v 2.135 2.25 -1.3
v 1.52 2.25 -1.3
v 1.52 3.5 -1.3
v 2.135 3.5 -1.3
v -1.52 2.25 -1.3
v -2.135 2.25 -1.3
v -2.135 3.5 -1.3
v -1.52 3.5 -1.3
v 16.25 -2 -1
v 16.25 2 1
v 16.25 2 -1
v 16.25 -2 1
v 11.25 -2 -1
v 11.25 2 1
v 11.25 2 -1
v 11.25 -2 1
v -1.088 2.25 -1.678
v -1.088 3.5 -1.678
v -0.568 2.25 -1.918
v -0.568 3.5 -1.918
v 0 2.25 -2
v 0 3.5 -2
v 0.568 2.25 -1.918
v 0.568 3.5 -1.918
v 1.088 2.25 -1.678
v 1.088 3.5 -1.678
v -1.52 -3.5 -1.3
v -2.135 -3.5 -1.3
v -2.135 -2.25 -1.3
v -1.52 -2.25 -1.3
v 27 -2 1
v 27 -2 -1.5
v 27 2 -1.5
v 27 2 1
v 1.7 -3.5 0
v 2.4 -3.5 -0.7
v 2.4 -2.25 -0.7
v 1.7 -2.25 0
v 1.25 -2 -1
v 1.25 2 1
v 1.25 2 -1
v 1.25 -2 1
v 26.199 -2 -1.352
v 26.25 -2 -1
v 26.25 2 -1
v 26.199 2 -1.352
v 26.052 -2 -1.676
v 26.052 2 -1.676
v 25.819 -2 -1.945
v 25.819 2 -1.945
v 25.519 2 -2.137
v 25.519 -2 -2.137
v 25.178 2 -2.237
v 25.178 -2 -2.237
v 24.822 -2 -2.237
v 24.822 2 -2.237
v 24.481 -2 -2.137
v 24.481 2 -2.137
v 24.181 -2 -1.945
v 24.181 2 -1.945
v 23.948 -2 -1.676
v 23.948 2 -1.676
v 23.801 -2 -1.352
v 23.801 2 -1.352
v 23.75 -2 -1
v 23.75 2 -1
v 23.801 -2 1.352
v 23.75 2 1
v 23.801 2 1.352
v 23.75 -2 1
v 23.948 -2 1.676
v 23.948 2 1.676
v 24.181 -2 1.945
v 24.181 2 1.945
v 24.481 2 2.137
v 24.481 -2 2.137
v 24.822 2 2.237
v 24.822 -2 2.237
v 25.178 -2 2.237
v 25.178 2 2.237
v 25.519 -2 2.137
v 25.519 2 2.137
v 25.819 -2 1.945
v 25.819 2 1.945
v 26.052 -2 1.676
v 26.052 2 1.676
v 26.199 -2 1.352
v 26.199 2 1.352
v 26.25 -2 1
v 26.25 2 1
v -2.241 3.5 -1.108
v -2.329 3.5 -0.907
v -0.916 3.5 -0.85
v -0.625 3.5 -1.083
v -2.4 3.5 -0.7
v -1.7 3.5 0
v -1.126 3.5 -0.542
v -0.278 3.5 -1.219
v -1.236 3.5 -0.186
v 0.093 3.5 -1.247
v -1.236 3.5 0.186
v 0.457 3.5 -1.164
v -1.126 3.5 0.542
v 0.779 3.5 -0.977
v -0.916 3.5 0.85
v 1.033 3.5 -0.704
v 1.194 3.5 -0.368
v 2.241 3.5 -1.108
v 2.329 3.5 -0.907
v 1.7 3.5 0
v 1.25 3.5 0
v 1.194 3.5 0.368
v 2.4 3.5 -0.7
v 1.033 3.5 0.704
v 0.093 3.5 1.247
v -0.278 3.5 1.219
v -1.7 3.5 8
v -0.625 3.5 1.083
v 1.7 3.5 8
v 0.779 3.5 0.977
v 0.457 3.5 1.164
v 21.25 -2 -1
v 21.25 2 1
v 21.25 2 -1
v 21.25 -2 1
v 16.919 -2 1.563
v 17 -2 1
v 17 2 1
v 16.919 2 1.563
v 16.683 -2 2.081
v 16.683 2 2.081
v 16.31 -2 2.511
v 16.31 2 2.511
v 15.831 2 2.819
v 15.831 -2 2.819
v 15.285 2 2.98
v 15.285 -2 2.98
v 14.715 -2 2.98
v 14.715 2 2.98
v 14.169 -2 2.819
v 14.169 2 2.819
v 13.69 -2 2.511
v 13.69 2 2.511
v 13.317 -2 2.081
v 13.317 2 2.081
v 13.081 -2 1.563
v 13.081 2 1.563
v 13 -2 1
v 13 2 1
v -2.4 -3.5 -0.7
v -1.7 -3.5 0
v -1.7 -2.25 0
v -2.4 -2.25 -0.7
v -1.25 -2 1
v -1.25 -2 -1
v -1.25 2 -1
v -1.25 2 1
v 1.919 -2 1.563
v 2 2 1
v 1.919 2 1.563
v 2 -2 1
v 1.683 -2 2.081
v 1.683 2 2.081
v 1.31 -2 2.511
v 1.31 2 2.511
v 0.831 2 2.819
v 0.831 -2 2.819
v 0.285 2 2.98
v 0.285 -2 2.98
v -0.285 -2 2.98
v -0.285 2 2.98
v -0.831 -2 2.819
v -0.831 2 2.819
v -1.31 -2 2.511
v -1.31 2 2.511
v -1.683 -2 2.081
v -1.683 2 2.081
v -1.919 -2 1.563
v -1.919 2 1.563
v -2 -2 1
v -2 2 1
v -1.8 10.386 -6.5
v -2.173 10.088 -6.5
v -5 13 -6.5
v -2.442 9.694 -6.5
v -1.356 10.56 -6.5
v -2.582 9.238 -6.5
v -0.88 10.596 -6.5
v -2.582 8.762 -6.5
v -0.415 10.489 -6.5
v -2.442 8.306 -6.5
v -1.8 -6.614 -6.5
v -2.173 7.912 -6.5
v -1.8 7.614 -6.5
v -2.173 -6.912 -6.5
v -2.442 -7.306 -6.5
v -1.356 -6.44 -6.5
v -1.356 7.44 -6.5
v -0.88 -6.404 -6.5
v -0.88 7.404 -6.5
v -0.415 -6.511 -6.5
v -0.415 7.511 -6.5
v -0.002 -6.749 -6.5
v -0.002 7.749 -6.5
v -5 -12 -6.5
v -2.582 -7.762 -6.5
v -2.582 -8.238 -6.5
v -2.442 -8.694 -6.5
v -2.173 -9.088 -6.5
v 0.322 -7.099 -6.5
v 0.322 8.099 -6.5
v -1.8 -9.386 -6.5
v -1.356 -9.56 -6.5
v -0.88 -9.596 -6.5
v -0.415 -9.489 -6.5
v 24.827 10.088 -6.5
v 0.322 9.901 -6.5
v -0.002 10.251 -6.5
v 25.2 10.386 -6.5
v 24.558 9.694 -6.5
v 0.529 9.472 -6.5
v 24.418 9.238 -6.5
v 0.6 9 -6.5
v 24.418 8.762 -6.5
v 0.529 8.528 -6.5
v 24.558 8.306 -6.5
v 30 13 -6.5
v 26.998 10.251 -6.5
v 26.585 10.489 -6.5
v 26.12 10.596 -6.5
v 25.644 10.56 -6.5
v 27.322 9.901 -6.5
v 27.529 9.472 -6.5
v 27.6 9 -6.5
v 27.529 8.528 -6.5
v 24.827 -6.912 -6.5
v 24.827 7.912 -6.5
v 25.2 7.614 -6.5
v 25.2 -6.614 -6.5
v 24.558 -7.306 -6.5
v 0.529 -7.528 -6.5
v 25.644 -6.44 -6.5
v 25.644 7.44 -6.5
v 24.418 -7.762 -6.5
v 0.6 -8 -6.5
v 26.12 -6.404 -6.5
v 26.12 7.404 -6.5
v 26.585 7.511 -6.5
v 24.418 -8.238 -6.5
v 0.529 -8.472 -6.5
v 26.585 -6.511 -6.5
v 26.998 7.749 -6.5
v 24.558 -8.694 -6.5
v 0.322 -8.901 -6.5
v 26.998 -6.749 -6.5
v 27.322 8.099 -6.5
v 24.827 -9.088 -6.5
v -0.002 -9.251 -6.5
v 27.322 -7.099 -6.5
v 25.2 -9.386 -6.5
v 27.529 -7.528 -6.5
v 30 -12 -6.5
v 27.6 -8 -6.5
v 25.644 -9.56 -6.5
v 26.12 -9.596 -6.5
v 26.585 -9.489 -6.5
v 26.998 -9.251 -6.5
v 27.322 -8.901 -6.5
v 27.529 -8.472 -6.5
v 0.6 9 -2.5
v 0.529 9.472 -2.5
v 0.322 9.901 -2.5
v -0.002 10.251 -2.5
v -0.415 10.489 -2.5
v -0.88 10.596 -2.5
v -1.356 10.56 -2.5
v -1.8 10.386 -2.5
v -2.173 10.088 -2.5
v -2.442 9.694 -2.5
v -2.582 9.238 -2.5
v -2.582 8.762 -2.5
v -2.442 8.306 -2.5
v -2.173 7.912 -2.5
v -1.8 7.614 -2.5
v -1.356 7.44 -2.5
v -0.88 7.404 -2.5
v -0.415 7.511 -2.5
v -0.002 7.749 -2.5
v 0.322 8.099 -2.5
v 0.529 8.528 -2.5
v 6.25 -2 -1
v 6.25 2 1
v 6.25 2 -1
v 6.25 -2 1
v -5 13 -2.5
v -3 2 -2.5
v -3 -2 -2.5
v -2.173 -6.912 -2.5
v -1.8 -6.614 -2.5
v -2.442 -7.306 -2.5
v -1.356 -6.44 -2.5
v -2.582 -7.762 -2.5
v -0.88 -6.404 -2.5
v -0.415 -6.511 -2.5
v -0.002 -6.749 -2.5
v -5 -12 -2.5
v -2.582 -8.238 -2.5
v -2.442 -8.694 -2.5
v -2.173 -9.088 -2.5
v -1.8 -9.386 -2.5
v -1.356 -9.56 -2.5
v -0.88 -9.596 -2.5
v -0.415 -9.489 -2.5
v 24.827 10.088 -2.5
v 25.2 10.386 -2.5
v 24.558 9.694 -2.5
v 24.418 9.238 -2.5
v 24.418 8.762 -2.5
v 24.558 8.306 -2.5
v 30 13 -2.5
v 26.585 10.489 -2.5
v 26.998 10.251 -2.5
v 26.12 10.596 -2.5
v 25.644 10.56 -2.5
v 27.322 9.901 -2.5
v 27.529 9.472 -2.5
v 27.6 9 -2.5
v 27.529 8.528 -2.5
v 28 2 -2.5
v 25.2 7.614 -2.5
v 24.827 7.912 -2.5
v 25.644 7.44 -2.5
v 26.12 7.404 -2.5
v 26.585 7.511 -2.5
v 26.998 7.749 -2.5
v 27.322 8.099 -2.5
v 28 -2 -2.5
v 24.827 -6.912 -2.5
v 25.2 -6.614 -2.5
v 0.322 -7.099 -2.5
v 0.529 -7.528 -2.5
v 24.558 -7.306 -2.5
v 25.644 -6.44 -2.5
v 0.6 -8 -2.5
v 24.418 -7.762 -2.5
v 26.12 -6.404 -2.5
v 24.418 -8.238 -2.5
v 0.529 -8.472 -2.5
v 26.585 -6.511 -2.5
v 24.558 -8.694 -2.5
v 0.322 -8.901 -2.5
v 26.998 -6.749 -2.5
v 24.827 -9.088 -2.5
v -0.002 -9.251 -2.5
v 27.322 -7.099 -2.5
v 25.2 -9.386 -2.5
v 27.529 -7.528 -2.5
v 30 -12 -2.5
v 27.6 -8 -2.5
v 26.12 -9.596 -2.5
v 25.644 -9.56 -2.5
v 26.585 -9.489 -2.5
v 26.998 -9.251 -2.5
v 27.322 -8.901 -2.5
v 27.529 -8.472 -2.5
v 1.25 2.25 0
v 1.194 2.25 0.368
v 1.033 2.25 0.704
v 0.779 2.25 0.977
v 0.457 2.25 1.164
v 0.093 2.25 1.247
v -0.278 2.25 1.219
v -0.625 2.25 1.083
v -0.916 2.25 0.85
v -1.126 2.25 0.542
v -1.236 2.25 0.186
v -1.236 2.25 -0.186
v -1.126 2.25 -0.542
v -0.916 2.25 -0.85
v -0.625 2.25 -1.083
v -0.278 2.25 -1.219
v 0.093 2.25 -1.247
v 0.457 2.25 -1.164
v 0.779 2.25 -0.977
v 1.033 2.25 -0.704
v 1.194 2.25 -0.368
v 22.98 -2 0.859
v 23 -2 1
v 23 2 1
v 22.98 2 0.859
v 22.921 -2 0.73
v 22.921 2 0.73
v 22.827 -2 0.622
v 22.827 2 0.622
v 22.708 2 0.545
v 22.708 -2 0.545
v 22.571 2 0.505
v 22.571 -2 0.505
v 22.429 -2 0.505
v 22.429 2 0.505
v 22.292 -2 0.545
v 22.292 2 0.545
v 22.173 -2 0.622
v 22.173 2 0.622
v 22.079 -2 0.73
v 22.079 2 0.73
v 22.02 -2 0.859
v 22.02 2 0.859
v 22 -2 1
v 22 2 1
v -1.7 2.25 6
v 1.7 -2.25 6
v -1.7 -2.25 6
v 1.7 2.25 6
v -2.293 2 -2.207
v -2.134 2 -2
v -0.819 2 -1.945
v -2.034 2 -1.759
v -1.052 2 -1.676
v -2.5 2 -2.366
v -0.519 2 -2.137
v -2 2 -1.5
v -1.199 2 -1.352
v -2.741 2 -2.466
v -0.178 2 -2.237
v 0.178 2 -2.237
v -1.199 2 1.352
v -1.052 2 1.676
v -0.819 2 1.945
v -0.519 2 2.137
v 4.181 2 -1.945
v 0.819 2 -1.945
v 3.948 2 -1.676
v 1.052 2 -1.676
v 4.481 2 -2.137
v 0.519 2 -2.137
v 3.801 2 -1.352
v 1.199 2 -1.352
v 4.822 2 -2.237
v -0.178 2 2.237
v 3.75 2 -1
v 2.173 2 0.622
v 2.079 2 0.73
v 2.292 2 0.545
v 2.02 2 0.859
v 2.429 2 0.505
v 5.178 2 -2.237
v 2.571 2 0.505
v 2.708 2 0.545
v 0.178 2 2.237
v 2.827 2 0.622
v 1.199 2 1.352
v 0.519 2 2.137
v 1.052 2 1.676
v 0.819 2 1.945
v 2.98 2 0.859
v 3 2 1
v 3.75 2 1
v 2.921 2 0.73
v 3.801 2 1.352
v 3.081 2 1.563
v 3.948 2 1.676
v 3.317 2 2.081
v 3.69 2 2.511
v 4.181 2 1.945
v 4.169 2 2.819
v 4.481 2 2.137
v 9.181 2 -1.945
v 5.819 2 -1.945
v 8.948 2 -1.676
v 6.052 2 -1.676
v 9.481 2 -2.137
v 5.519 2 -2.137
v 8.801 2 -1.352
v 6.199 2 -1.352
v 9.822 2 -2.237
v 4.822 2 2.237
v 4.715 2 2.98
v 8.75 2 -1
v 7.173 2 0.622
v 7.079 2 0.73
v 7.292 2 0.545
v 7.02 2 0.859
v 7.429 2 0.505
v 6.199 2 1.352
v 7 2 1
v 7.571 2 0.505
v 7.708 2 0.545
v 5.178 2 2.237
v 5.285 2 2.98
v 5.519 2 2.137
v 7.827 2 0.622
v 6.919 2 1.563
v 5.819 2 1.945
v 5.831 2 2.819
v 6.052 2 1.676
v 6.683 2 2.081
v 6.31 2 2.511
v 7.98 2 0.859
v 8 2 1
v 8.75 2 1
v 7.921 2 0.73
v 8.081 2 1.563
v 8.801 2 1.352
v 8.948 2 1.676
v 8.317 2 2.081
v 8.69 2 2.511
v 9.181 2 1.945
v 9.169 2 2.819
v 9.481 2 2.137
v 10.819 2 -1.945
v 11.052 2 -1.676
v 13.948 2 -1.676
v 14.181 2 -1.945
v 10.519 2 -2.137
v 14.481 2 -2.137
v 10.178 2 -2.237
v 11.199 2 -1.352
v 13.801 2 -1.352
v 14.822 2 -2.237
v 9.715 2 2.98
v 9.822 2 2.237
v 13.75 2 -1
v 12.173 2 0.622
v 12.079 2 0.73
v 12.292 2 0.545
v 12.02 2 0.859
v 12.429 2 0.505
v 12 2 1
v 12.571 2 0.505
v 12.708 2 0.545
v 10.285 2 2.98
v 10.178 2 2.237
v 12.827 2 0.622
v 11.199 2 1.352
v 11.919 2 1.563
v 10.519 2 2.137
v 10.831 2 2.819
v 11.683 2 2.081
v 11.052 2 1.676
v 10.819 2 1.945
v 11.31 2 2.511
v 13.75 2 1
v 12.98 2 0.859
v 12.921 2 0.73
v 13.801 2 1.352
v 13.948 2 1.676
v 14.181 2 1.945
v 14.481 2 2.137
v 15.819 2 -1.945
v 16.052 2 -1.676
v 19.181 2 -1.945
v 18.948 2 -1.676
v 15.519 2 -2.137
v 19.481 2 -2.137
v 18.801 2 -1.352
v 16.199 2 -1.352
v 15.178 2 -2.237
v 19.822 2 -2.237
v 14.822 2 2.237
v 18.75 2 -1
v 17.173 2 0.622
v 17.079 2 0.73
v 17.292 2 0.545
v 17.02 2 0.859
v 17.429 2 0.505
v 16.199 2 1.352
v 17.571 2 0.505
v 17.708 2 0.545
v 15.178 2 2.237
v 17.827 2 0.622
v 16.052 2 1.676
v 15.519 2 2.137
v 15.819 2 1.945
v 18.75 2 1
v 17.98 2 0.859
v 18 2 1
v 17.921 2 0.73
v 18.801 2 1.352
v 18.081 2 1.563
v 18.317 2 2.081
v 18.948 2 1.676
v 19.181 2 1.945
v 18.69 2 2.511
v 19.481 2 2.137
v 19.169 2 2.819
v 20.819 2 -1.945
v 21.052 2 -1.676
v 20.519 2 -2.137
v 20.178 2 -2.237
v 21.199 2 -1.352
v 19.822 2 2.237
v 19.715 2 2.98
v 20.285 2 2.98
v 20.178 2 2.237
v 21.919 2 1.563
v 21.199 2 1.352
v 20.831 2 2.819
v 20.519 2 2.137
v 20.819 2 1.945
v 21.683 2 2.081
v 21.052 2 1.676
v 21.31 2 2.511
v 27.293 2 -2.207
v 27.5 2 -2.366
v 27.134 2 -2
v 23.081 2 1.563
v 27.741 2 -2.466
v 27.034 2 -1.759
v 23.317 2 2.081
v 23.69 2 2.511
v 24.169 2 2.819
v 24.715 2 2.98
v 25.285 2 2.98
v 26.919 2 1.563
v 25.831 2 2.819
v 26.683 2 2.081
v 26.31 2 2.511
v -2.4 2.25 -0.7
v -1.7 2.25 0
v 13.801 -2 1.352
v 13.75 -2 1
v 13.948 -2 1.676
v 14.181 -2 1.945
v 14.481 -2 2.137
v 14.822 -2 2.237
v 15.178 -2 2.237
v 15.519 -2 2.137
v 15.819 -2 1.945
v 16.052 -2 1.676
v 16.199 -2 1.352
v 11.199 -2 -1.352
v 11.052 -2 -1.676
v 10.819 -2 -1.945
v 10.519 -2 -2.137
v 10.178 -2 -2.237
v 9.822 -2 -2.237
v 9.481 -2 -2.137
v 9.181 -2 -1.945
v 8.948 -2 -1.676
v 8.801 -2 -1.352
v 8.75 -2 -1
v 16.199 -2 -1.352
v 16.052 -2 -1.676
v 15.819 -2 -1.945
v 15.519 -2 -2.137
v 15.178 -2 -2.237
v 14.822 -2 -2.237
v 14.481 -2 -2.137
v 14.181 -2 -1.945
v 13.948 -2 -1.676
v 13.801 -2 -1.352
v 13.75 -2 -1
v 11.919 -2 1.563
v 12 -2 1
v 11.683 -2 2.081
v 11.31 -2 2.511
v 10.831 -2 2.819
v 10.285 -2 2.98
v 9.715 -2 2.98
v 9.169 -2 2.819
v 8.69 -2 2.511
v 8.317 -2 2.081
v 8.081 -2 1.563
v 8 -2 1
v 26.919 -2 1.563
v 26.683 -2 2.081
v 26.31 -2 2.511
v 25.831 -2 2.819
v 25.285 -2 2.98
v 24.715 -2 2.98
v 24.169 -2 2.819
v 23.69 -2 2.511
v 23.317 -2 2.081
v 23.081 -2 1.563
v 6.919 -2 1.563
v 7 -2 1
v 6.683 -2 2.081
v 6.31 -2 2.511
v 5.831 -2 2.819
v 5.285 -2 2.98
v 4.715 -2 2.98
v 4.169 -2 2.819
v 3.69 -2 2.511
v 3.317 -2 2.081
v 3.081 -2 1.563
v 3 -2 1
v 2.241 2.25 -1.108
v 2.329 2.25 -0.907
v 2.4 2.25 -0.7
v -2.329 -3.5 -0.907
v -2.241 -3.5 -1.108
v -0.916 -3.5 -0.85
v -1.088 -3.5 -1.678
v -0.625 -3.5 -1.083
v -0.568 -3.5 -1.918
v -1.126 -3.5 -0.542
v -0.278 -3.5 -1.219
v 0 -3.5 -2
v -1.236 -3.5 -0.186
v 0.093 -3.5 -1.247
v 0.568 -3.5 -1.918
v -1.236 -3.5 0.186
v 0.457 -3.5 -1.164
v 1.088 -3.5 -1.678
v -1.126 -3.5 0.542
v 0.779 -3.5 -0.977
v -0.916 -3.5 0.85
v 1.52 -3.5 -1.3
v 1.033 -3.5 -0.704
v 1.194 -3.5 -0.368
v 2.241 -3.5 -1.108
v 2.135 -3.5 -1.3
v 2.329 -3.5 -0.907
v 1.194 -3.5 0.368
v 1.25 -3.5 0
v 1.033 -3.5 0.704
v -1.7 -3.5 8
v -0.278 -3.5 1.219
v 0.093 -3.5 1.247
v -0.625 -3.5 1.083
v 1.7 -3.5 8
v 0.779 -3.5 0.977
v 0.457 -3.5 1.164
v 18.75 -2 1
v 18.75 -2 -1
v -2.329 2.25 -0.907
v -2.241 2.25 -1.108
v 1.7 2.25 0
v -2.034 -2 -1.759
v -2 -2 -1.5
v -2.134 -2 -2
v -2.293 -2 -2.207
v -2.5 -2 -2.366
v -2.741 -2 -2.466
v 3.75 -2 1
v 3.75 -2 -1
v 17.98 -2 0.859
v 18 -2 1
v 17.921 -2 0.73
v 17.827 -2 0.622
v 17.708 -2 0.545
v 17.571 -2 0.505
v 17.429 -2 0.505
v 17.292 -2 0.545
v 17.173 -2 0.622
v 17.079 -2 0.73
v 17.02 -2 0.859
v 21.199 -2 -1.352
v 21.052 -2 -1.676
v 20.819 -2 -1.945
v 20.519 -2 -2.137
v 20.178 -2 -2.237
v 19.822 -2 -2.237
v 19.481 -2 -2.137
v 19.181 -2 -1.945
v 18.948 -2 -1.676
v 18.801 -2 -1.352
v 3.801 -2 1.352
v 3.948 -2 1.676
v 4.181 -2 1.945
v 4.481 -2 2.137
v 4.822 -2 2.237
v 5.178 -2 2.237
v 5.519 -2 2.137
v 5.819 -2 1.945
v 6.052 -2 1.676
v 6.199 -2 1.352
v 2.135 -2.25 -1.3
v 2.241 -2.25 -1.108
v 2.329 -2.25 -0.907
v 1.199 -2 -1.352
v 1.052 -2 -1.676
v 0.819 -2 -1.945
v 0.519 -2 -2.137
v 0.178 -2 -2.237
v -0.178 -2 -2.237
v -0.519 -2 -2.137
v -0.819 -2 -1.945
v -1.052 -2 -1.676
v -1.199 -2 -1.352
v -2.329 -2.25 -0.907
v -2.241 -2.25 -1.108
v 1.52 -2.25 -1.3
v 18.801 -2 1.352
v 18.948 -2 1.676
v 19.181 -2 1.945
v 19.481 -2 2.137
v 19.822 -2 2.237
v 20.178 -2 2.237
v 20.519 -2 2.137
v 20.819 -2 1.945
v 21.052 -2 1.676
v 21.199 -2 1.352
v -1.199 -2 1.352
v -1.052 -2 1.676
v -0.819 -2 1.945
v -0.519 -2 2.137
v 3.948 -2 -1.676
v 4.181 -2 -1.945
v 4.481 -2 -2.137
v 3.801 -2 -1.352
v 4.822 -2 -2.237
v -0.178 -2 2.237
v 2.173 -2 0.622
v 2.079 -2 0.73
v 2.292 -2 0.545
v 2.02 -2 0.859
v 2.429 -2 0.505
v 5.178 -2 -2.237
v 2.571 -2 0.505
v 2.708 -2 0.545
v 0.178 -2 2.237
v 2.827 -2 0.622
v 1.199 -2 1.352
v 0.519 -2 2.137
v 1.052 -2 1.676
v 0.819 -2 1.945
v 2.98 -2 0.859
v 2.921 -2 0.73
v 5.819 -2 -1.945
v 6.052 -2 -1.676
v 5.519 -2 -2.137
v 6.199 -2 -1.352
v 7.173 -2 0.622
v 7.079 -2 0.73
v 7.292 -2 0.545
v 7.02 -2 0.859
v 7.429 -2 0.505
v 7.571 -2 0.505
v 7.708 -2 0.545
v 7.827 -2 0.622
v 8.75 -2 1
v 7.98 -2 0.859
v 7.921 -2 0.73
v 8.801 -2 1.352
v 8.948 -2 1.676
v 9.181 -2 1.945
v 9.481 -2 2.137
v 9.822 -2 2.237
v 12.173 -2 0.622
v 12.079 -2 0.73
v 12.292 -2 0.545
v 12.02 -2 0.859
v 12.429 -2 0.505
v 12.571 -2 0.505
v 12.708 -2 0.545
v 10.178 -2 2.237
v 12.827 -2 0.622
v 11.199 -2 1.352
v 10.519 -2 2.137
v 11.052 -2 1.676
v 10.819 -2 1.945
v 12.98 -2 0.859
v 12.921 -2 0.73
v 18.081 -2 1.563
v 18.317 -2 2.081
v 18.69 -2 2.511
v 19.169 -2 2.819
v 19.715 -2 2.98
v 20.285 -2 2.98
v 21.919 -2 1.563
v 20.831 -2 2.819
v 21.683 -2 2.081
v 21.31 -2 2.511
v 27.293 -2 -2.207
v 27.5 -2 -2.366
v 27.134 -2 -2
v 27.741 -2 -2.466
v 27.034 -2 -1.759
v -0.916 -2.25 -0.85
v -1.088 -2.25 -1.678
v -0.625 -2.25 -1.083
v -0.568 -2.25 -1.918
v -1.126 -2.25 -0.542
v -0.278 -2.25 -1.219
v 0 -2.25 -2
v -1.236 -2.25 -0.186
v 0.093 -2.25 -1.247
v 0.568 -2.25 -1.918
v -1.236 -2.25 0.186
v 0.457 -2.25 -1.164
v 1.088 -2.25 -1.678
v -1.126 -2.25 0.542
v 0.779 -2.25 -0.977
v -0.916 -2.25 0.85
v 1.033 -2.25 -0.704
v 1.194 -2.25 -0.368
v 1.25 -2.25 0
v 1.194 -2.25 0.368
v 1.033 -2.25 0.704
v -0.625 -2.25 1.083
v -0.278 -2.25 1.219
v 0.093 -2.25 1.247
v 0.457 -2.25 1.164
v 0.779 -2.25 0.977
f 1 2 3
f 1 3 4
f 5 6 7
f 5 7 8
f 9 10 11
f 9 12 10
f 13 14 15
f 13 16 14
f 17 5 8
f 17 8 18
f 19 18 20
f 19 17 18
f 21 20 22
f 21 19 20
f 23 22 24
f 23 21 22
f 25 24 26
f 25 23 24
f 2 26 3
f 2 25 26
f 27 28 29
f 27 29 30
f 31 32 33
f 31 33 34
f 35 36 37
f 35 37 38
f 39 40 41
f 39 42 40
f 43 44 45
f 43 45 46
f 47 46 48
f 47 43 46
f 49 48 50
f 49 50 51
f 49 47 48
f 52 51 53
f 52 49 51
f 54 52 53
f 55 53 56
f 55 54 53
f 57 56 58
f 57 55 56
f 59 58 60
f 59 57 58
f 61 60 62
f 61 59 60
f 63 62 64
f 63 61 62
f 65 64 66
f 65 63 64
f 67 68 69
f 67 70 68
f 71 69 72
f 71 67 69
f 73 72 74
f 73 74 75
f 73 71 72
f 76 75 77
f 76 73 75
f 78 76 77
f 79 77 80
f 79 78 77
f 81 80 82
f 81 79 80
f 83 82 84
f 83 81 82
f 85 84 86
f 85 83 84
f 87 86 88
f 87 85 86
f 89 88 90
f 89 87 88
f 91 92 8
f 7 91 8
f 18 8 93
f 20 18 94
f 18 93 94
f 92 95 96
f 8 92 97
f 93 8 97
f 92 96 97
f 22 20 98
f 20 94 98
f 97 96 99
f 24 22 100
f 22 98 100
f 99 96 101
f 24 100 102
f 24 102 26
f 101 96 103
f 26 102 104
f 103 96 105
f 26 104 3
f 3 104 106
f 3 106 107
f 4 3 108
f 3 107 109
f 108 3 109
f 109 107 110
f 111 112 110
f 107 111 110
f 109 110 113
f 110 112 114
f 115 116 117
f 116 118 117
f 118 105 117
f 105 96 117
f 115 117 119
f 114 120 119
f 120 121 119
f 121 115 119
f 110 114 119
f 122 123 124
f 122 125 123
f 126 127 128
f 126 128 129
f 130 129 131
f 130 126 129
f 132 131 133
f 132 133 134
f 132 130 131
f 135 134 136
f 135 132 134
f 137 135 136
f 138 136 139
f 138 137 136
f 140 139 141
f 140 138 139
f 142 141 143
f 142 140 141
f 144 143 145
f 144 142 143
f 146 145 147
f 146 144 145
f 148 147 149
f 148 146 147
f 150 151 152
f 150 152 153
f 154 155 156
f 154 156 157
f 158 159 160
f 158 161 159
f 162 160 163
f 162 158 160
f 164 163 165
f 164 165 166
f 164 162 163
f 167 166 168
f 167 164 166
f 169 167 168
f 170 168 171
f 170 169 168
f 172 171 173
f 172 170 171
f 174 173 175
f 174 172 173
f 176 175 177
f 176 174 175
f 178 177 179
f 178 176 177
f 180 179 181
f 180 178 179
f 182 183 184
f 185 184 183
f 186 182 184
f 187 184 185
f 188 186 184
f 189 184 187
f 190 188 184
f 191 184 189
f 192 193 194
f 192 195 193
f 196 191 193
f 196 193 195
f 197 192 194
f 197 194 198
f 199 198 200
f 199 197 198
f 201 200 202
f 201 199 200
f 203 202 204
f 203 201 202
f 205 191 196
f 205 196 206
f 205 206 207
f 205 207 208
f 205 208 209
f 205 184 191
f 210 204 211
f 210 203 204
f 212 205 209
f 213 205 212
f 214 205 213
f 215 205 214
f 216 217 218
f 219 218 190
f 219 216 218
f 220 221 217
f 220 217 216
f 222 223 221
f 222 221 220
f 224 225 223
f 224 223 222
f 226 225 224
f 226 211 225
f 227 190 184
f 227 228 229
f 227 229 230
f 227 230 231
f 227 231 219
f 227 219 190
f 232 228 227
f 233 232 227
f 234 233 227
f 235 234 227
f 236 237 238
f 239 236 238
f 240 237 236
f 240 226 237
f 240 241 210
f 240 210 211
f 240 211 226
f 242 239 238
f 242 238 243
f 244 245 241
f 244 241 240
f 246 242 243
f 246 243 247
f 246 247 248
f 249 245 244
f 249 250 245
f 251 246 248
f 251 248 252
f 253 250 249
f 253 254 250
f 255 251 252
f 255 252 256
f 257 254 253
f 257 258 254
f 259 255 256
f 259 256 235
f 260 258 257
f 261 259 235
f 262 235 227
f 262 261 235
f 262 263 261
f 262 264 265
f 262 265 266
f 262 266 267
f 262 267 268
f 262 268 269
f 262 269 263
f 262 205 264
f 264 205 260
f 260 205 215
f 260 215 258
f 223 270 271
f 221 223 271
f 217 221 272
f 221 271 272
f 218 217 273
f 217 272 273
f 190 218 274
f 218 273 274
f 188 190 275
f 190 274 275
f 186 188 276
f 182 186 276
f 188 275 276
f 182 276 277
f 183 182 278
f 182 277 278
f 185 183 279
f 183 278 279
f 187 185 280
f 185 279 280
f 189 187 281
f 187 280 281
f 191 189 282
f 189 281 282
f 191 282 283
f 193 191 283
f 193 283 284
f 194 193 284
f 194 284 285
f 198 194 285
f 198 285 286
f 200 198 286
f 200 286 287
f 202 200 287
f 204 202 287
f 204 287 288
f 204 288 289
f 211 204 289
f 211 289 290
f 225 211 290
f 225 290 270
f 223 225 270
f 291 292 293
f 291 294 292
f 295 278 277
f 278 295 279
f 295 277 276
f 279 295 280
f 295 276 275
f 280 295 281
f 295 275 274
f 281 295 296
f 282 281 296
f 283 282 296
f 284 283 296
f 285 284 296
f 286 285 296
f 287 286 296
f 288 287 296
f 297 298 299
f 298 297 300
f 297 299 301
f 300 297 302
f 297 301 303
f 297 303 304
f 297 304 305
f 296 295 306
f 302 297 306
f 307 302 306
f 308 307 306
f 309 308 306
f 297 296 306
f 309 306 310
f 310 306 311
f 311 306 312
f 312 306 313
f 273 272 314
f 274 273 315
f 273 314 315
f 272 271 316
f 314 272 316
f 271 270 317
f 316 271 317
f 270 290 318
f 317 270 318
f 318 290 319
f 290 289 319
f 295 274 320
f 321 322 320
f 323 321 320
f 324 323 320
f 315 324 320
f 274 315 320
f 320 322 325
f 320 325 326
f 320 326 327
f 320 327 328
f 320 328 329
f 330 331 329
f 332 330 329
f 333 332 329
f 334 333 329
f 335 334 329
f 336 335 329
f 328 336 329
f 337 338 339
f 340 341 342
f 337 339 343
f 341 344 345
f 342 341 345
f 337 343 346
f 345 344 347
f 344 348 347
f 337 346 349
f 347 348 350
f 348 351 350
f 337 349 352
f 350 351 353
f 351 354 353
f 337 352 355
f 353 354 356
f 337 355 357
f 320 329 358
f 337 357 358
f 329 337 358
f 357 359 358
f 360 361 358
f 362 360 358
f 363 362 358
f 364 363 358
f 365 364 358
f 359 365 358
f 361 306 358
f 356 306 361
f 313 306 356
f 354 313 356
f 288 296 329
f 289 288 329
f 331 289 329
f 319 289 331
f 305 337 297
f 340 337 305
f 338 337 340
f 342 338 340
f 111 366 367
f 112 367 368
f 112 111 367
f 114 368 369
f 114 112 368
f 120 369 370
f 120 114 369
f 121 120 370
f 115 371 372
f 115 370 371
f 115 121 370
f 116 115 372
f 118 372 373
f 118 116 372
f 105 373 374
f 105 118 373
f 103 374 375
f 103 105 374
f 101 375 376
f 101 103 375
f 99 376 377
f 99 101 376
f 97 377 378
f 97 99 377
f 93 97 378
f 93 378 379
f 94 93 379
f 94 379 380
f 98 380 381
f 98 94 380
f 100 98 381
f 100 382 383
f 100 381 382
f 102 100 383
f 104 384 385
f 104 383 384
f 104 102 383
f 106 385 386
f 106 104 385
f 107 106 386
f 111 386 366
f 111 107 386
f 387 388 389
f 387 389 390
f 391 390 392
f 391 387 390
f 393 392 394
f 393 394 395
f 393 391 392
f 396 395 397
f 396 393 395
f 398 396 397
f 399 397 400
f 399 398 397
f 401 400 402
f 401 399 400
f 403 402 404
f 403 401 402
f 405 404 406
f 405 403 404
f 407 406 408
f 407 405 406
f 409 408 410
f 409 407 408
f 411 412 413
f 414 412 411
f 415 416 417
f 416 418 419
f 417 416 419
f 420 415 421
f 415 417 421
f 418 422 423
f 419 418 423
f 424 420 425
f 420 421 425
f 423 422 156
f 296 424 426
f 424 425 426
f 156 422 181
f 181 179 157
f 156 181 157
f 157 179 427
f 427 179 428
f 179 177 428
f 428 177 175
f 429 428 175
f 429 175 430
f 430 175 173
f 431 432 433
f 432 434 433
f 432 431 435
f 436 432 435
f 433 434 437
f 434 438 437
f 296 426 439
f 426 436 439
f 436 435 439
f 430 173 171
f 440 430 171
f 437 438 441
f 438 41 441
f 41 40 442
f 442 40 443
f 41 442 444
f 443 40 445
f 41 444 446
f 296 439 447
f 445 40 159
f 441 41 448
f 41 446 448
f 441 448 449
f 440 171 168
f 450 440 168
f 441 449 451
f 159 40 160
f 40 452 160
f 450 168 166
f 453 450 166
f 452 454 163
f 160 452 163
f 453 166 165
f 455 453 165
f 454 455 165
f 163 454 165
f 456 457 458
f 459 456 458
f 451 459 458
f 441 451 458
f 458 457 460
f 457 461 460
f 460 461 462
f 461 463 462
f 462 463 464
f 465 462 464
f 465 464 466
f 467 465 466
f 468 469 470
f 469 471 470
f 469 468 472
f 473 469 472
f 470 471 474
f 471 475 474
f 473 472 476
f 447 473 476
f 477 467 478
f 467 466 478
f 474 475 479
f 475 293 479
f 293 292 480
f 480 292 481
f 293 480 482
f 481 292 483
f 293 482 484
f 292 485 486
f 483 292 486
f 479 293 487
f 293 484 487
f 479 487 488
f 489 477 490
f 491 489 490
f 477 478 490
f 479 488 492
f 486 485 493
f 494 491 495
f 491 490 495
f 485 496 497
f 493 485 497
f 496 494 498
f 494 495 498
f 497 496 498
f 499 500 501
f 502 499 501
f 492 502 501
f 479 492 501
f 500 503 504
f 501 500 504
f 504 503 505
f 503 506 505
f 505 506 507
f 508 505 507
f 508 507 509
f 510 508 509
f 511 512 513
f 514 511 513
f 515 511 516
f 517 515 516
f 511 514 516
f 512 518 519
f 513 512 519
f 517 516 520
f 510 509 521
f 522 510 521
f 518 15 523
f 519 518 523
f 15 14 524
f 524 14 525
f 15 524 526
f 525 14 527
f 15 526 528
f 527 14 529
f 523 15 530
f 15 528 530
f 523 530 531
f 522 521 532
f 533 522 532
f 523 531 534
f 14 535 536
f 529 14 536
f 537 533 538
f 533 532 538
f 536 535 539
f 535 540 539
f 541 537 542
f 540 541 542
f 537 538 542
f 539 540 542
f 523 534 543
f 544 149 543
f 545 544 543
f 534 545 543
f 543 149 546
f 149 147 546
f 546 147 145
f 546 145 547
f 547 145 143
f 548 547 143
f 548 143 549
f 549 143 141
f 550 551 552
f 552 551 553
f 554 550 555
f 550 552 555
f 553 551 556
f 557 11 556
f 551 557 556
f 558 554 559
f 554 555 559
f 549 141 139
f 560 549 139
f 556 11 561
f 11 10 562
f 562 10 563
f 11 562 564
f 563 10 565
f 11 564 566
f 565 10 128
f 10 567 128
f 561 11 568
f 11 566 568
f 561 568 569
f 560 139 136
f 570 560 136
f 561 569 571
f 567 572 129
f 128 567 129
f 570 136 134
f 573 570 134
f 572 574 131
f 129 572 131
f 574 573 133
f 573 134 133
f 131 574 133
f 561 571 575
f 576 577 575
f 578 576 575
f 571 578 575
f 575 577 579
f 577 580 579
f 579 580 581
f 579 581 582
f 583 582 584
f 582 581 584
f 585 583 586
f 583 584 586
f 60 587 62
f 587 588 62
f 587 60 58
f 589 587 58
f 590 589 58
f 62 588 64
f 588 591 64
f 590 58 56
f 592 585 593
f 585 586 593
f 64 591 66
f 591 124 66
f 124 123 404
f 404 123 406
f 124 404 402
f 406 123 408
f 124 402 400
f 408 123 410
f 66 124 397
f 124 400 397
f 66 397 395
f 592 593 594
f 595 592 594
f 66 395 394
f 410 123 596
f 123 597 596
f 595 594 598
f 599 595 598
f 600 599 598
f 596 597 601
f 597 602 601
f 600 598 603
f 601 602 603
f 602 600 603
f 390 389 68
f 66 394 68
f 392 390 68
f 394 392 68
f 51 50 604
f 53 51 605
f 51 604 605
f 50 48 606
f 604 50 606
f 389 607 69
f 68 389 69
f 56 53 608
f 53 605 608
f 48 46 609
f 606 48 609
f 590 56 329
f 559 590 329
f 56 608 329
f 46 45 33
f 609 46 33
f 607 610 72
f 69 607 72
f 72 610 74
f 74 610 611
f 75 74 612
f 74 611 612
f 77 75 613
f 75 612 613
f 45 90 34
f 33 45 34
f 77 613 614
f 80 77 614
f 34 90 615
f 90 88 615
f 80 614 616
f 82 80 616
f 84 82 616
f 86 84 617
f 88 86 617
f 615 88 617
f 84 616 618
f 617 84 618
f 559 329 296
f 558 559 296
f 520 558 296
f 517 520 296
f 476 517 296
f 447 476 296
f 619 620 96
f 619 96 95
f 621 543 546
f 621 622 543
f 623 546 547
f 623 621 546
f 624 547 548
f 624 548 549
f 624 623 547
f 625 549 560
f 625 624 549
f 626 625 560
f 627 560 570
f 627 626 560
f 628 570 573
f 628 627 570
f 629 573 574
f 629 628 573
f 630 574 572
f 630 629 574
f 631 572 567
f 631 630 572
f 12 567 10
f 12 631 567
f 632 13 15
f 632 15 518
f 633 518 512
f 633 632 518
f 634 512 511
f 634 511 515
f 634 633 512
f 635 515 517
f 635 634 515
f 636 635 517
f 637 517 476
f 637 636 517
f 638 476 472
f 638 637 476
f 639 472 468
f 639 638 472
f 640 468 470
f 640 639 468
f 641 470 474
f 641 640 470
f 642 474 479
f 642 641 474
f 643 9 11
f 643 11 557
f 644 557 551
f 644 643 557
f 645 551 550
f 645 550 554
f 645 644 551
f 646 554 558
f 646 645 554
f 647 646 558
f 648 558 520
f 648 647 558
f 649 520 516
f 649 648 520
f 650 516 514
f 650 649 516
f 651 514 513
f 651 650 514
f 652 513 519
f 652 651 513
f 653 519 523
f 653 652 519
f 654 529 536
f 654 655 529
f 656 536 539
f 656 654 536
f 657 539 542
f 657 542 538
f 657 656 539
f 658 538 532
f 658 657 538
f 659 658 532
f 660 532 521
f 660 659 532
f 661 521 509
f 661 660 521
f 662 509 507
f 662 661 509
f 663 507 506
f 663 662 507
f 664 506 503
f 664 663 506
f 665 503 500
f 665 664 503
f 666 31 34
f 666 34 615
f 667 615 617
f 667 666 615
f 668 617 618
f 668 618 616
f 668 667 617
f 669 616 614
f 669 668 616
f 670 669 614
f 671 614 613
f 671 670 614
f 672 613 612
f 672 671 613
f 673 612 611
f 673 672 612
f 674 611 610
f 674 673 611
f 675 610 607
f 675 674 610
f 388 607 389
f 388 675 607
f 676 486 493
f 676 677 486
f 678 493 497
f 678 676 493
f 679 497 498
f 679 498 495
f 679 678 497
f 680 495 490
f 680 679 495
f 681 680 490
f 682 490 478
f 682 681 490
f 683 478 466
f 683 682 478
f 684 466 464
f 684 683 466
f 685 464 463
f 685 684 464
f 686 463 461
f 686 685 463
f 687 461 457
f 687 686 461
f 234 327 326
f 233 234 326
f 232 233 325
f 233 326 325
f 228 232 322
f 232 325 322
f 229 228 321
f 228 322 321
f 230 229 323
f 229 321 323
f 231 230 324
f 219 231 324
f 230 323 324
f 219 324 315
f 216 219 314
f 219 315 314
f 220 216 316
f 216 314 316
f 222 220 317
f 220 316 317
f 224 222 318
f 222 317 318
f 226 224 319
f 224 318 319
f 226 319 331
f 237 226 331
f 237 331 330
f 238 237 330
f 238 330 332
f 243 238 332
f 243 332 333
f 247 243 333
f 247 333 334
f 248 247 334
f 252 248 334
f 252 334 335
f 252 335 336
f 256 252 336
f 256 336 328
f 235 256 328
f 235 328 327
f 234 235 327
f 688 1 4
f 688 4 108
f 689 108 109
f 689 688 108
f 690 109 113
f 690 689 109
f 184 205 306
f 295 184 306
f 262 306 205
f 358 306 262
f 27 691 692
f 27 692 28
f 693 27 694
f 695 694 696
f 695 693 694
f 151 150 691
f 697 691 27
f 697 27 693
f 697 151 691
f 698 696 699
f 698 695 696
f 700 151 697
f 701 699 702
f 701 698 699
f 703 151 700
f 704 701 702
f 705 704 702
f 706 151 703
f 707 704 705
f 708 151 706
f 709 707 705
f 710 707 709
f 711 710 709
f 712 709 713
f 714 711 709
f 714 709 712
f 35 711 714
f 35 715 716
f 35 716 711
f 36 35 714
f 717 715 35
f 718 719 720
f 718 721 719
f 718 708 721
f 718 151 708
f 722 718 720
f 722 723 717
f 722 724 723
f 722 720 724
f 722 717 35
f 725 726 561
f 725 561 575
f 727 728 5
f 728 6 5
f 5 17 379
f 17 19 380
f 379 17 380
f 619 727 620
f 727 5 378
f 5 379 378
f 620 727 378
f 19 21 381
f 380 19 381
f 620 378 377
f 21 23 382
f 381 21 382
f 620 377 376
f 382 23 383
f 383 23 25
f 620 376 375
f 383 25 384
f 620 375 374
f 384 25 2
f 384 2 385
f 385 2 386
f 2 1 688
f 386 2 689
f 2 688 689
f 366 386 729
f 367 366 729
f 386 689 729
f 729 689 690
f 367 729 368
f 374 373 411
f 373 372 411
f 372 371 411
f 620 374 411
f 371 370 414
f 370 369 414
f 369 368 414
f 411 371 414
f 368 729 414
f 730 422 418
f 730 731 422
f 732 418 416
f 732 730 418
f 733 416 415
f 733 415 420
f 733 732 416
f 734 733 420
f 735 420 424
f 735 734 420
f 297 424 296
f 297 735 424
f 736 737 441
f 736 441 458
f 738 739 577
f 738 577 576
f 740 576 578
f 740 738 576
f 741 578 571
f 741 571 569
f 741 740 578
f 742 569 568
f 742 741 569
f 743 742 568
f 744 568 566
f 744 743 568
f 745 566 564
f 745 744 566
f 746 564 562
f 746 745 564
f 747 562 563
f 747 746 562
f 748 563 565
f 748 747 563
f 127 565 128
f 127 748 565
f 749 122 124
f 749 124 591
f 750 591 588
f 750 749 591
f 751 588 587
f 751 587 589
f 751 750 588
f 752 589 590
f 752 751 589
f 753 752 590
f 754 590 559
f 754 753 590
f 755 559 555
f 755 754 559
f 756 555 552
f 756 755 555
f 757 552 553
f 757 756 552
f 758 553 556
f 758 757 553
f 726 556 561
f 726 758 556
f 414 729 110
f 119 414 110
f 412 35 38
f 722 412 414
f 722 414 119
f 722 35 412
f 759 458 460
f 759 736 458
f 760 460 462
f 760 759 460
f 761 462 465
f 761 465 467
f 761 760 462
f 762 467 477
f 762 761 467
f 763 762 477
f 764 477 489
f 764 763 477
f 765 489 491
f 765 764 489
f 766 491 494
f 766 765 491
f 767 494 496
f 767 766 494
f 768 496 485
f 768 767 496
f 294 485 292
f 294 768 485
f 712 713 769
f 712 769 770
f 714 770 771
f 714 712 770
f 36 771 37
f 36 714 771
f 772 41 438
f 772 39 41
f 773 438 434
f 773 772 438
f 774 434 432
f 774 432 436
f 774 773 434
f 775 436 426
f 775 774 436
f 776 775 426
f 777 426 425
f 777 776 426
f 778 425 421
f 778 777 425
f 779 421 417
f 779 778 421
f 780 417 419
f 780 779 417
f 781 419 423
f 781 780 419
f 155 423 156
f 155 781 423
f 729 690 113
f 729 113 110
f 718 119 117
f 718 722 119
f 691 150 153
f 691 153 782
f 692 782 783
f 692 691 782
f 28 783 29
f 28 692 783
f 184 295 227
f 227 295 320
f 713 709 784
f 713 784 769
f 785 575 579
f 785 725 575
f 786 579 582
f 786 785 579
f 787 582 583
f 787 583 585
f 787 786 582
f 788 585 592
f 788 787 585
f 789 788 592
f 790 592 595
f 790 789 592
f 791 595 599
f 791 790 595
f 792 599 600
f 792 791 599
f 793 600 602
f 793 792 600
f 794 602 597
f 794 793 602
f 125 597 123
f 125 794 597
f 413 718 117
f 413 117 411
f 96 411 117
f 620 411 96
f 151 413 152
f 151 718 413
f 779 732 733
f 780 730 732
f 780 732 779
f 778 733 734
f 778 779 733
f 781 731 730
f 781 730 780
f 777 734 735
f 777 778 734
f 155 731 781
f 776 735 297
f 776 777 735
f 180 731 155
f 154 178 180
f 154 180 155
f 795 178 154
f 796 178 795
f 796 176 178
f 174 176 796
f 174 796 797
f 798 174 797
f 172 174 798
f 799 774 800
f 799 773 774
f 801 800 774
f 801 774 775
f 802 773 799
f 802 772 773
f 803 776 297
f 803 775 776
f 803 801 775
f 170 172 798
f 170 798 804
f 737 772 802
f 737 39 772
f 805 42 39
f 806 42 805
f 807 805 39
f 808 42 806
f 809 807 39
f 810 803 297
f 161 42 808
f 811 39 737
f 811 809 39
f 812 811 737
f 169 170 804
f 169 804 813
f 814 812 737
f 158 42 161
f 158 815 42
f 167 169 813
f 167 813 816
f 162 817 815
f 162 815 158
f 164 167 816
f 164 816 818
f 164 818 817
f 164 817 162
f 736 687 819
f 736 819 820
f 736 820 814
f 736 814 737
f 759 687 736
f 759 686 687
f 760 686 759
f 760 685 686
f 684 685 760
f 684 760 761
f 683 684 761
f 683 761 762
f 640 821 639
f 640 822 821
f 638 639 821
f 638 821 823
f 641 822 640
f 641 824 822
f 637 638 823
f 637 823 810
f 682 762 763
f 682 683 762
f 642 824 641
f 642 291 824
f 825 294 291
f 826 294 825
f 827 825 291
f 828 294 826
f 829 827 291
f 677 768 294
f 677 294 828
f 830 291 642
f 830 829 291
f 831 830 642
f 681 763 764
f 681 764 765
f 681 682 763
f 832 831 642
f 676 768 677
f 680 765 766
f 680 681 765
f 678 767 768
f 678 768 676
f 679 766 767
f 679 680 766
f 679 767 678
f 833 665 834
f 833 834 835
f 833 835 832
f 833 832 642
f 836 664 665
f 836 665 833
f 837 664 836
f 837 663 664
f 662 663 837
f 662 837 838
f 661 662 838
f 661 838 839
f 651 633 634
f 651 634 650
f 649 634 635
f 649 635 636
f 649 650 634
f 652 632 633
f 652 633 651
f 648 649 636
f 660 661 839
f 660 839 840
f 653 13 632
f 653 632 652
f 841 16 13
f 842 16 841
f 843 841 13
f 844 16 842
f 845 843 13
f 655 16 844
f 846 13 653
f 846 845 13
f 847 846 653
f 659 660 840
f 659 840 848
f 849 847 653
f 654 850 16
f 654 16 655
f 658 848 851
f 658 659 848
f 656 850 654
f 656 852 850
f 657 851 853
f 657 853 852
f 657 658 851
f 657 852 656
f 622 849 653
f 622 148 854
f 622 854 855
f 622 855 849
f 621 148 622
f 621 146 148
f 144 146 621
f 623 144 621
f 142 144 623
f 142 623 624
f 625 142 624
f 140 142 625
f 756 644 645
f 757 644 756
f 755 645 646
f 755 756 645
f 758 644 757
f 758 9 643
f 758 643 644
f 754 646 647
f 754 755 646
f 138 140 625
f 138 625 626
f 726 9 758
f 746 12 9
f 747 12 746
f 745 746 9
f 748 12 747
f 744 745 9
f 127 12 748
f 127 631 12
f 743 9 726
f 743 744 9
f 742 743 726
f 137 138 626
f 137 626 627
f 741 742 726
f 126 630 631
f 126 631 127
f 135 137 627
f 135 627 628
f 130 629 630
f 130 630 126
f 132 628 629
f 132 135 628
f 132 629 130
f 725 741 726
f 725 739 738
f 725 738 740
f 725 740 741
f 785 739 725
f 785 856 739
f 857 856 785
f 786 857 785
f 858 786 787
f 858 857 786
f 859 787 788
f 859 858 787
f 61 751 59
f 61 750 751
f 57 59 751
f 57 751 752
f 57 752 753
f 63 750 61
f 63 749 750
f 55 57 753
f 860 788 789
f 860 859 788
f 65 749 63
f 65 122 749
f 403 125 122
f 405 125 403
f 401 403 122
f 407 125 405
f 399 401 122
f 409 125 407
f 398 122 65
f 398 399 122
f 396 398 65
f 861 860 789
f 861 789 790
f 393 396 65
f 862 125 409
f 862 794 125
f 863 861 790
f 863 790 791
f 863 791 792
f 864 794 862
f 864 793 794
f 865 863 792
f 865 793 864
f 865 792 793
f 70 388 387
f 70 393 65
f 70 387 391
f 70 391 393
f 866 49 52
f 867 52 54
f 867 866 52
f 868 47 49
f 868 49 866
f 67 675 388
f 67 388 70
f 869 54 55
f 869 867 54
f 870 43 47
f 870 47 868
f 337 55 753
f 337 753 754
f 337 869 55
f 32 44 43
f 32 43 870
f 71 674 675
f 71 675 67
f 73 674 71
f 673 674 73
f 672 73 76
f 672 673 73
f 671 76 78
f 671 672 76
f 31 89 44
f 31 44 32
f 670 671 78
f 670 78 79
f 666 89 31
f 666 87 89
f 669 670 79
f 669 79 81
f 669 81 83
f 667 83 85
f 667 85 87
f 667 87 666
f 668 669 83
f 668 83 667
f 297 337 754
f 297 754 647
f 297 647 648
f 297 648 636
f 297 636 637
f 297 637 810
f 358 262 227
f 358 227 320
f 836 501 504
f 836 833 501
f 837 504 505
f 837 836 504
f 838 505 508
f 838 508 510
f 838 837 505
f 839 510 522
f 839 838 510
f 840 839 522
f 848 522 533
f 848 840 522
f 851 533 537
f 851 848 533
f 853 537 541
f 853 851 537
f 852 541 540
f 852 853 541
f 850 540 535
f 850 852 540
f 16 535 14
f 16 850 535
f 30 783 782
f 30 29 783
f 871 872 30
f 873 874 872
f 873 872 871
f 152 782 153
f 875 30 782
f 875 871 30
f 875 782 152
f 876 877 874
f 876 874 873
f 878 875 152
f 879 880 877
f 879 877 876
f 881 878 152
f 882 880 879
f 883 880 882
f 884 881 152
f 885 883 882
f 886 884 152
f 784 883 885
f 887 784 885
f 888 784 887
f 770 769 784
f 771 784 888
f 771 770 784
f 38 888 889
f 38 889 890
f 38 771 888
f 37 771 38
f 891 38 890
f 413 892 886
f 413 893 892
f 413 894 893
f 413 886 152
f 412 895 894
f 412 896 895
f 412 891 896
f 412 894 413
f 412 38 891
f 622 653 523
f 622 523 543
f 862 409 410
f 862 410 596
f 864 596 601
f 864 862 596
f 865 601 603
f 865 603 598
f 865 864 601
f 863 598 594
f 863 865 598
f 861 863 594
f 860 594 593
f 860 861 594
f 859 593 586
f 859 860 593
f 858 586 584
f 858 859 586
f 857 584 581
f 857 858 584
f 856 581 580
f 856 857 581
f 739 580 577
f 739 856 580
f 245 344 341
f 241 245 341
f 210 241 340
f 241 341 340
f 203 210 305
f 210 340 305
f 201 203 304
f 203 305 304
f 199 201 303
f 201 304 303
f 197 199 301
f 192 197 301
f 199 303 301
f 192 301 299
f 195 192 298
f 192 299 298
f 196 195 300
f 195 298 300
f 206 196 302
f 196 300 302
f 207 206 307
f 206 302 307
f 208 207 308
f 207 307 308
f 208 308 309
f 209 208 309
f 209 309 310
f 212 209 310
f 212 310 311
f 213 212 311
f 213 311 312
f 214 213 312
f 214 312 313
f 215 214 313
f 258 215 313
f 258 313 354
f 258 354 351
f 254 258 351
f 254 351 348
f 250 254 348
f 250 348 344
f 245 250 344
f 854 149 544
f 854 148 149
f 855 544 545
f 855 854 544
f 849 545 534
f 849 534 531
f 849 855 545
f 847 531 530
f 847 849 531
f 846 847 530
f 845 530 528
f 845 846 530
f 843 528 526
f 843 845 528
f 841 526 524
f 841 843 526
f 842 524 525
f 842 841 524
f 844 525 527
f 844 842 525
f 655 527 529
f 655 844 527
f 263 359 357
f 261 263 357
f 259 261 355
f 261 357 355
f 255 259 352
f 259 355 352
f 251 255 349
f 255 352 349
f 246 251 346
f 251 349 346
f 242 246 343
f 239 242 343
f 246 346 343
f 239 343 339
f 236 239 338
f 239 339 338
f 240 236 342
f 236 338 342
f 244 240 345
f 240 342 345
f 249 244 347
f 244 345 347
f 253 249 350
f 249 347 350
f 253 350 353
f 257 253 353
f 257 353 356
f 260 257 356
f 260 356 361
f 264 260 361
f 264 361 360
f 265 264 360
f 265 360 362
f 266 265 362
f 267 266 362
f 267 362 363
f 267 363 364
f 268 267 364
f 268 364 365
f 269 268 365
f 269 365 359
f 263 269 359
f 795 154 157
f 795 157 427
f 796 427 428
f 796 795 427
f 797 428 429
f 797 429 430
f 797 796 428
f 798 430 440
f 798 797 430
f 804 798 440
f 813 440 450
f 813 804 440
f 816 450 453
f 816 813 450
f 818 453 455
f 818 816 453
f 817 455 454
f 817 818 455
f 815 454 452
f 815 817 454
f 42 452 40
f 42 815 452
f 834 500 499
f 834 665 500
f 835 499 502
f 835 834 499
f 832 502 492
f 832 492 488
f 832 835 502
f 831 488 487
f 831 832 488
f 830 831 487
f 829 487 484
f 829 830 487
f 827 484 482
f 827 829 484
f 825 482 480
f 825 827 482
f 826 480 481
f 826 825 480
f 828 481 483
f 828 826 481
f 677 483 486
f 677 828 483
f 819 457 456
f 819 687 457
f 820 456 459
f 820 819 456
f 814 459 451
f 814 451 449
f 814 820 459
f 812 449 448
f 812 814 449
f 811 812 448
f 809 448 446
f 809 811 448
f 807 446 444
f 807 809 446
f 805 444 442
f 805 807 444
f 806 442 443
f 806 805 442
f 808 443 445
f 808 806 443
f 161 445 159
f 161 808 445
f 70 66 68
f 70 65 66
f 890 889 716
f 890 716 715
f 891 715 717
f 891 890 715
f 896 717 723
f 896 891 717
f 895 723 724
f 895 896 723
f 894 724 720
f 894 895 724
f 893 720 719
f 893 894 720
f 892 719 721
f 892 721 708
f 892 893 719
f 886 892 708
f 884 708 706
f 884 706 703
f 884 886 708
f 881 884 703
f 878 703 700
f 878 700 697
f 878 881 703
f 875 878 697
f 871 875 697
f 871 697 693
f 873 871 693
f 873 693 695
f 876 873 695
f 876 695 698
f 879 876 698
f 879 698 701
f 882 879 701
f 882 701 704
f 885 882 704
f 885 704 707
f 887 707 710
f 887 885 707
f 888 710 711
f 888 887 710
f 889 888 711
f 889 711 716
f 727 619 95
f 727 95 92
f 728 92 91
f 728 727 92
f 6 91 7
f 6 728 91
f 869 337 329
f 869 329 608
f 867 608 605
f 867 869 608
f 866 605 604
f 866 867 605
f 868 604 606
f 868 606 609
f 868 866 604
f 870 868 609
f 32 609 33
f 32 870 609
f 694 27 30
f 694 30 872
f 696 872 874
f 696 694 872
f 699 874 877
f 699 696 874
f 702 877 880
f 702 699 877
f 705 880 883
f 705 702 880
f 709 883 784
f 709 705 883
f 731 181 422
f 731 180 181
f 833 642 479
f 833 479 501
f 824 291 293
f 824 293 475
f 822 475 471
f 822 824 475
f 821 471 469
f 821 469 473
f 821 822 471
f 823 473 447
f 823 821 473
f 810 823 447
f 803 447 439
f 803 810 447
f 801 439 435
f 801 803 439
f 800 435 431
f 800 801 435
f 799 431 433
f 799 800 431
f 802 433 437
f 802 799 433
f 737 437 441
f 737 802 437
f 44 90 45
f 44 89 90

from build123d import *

# Parameters (mm, degrees)
F1_DEPTH      = 2
F2_W          = 35
F2_H          = 4
F3_DEPTH      = 10
F3_DEPTH_BACK = 15
F4_R          = 1.6
F5_DEPTH      = 6.5
F6_R          = 1.25
F7_DEPTH      = 3.5
F8_W          = 4.5
F8_H          = 8.2
F9_DEPTH      = 12.5


with BuildPart() as f1:
    # F0 (on Front) → F1 (new body, symmetric)
    with BuildSketch(Plane.XZ):
        with BuildLine():
            Line((-5, -2.5), (-5, -6.5))
            Line((-5, -6.5), (30, -6.5))
            Line((30, -6.5), (30, -2.5))
            Line((30, -2.5), (28, -2.5))
            ThreePointArc((28, -2.5), (27.2928932188, -2.2071067812), (27, -1.5))
            Line((27, -1.5), (27, 1))
            ThreePointArc((27, 1), (25, 3), (23, 1))
            ThreePointArc((23, 1), (22.5, 0.5), (22, 1))
            ThreePointArc((22, 1), (20, 3), (18, 1))
            ThreePointArc((18, 1), (17.5, 0.5), (17, 1))
            ThreePointArc((17, 1), (15, 3), (13, 1))
            ThreePointArc((13, 1), (12.5, 0.5), (12, 1))
            ThreePointArc((12, 1), (10, 3), (8, 1))
            ThreePointArc((8, 1), (7.5, 0.5), (7, 1))
            ThreePointArc((7, 1), (5, 3), (3, 1))
            ThreePointArc((3, 1), (2.5, 0.5), (2, 1))
            ThreePointArc((2, 1), (0, 3), (-2, 1))
            Line((-2, 1), (-2, -1.5))
            ThreePointArc((-2, -1.5), (-2.2928932188, -2.2071067812), (-3, -2.5))
            Line((-3, -2.5), (-5, -2.5))
        make_face()
        with BuildLine():
            Line((-1.25, -1), (-1.25, 1))
            ThreePointArc((-1.25, 1), (0, 2.25), (1.25, 1))
            Line((1.25, 1), (1.25, -1))
            ThreePointArc((1.25, -1), (0, -2.25), (-1.25, -1))
        make_face(mode=Mode.SUBTRACT)
        with BuildLine():
            ThreePointArc((6.25, -1), (5, -2.25), (3.75, -1))
            Line((3.75, -1), (3.75, 1))
            ThreePointArc((3.75, 1), (5, 2.25), (6.25, 1))
            Line((6.25, 1), (6.25, -1))
        make_face(mode=Mode.SUBTRACT)
        with BuildLine():
            ThreePointArc((11.25, -1), (10, -2.25), (8.75, -1))
            Line((8.75, -1), (8.75, 1))
            ThreePointArc((8.75, 1), (10, 2.25), (11.25, 1))
            Line((11.25, 1), (11.25, -1))
        make_face(mode=Mode.SUBTRACT)
        with BuildLine():
            ThreePointArc((16.25, -1), (15, -2.25), (13.75, -1))
            Line((13.75, -1), (13.75, 1))
            ThreePointArc((13.75, 1), (15, 2.25), (16.25, 1))
            Line((16.25, 1), (16.25, -1))
        make_face(mode=Mode.SUBTRACT)
        with BuildLine():
            ThreePointArc((21.25, -1), (20, -2.25), (18.75, -1))
            Line((18.75, -1), (18.75, 1))
            ThreePointArc((18.75, 1), (20, 2.25), (21.25, 1))
            Line((21.25, 1), (21.25, -1))
        make_face(mode=Mode.SUBTRACT)
        with BuildLine():
            ThreePointArc((26.25, -1), (25, -2.25), (23.75, -1))
            Line((23.75, -1), (23.75, 1))
            ThreePointArc((23.75, 1), (25, 2.25), (26.25, 1))
            Line((26.25, 1), (26.25, -1))
        make_face(mode=Mode.SUBTRACT)
    extrude(amount=F1_DEPTH, both=True)

    # F2 (on face) → F3 (join, two sides)
    with BuildSketch(Plane.XZ.offset(2)) as f3_sk:
        with Locations((12.5, -4.5)):
            Rectangle(F2_W, F2_H)
    extrude(amount=F3_DEPTH)
    extrude(f3_sk.sketch, amount=-F3_DEPTH_BACK)

    # F4 (on Top) → F5 (cut, through all)
    with BuildSketch(Plane.XY):
        with Locations((-1, 9)):
            Circle(F4_R)
        with Locations((26, 9)):
            Circle(F4_R)
        with Locations((26, -8)):
            Circle(F4_R)
        with Locations((-1, -8)):
            Circle(F4_R)
    extrude(amount=-F5_DEPTH, mode=Mode.SUBTRACT)


with BuildPart() as f7:
    # F6 (on Front) → F7 (new body, symmetric)
    with BuildSketch(Plane.XZ):
        with BuildLine():
            Line((-2.1354156504, -1.3), (-1.5198684154, -1.3))
            ThreePointArc((-1.5198684154, -1.3), (0, -2), (1.5198684154, -1.3))
            Line((1.5198684154, -1.3), (2.1354156504, -1.3))
            ThreePointArc((2.1354156504, -1.3), (2.2874655802, -1.0087126546), (2.4, -0.7))
            Line((2.4, -0.7), (1.7, 0))
            Line((1.7, 0), (1.7, 8))
            Line((1.7, 8), (-1.7, 8))
            Line((-1.7, 8), (-1.7, 0))
            Line((-1.7, 0), (-2.4, -0.7))
            ThreePointArc((-2.4, -0.7), (-2.2874655802, -1.0087126546), (-2.1354156504, -1.3))
        make_face()
        Circle(F6_R, mode=Mode.SUBTRACT)
    extrude(amount=F7_DEPTH, both=True)

    # F8 (on Right) → F9 (cut, symmetric)
    with BuildSketch(Plane.YZ):
        with Locations((0, 1.9)):
            Rectangle(F8_W, F8_H)
    extrude(amount=F9_DEPTH, both=True, mode=Mode.SUBTRACT)


solid = Compound([f1.part, f7.part])
